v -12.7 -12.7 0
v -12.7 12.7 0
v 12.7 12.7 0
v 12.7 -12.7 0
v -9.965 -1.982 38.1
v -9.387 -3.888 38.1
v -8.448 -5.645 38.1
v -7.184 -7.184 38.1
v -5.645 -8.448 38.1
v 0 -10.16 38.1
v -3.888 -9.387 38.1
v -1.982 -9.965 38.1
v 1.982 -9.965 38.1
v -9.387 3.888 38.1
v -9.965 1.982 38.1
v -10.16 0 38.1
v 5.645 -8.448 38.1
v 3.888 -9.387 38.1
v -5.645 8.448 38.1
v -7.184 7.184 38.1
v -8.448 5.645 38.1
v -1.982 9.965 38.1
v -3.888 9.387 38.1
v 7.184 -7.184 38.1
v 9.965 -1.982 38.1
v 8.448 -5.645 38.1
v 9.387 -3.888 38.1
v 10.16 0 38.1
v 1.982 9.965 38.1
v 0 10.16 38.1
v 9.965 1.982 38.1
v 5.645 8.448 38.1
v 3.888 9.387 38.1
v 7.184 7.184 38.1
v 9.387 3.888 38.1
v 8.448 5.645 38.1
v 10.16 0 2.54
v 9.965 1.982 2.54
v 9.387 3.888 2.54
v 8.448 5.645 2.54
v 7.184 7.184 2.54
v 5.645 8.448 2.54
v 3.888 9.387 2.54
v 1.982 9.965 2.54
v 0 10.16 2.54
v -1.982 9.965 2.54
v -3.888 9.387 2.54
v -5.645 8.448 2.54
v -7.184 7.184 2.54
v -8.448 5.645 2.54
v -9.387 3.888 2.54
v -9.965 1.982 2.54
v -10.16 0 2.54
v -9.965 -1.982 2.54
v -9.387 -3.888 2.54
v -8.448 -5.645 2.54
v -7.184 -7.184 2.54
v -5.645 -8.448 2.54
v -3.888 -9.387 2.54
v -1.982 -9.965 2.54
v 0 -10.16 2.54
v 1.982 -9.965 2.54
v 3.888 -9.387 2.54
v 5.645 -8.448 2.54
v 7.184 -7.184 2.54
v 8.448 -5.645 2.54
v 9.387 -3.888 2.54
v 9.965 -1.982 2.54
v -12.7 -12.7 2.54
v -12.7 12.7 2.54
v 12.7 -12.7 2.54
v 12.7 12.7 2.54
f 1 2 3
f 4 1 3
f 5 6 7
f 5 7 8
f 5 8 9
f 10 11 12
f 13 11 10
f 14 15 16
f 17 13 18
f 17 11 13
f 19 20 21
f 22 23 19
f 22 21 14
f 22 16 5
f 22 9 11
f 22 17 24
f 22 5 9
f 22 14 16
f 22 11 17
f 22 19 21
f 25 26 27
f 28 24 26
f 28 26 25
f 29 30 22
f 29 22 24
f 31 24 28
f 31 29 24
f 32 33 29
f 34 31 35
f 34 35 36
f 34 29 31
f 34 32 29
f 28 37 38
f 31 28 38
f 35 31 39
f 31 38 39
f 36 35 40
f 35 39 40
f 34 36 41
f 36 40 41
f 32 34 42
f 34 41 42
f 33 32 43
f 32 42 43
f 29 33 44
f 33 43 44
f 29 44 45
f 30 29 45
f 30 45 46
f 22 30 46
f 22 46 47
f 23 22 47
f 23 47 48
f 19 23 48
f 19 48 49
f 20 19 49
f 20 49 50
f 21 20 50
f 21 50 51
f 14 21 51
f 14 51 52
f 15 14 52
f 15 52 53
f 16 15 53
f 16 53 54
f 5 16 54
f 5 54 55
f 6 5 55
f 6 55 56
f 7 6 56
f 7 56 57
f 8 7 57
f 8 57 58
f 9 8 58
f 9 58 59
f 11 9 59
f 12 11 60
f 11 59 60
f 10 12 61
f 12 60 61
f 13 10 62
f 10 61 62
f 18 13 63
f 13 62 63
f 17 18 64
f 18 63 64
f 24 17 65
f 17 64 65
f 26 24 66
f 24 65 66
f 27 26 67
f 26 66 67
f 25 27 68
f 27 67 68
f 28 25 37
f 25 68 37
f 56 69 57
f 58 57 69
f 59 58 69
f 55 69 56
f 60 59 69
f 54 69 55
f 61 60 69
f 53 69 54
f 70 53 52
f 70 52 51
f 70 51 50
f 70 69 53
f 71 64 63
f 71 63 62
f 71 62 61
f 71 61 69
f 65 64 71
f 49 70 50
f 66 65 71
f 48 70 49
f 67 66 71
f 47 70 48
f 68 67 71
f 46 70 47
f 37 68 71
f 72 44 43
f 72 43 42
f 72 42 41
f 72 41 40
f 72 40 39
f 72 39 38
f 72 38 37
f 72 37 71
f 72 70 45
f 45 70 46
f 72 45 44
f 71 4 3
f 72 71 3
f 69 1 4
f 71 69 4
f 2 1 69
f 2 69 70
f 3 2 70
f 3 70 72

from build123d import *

# Parameters (mm, degrees)
F0_R     = 10.16
F1_DEPTH = 38.1
F2_W     = 25.4
F2_H     = 25.4
F3_DEPTH = 2.54


with BuildPart() as f1:
    # F0 (on Top) → F1 (new body)
    with BuildSketch(Plane.XY):
        Circle(F0_R)
    extrude(amount=F1_DEPTH)

    # F2 (on Top) → F3 (join)
    with BuildSketch(Plane.XY):
        Rectangle(F2_W, F2_H)
    extrude(amount=F3_DEPTH)


solid = f1.part
